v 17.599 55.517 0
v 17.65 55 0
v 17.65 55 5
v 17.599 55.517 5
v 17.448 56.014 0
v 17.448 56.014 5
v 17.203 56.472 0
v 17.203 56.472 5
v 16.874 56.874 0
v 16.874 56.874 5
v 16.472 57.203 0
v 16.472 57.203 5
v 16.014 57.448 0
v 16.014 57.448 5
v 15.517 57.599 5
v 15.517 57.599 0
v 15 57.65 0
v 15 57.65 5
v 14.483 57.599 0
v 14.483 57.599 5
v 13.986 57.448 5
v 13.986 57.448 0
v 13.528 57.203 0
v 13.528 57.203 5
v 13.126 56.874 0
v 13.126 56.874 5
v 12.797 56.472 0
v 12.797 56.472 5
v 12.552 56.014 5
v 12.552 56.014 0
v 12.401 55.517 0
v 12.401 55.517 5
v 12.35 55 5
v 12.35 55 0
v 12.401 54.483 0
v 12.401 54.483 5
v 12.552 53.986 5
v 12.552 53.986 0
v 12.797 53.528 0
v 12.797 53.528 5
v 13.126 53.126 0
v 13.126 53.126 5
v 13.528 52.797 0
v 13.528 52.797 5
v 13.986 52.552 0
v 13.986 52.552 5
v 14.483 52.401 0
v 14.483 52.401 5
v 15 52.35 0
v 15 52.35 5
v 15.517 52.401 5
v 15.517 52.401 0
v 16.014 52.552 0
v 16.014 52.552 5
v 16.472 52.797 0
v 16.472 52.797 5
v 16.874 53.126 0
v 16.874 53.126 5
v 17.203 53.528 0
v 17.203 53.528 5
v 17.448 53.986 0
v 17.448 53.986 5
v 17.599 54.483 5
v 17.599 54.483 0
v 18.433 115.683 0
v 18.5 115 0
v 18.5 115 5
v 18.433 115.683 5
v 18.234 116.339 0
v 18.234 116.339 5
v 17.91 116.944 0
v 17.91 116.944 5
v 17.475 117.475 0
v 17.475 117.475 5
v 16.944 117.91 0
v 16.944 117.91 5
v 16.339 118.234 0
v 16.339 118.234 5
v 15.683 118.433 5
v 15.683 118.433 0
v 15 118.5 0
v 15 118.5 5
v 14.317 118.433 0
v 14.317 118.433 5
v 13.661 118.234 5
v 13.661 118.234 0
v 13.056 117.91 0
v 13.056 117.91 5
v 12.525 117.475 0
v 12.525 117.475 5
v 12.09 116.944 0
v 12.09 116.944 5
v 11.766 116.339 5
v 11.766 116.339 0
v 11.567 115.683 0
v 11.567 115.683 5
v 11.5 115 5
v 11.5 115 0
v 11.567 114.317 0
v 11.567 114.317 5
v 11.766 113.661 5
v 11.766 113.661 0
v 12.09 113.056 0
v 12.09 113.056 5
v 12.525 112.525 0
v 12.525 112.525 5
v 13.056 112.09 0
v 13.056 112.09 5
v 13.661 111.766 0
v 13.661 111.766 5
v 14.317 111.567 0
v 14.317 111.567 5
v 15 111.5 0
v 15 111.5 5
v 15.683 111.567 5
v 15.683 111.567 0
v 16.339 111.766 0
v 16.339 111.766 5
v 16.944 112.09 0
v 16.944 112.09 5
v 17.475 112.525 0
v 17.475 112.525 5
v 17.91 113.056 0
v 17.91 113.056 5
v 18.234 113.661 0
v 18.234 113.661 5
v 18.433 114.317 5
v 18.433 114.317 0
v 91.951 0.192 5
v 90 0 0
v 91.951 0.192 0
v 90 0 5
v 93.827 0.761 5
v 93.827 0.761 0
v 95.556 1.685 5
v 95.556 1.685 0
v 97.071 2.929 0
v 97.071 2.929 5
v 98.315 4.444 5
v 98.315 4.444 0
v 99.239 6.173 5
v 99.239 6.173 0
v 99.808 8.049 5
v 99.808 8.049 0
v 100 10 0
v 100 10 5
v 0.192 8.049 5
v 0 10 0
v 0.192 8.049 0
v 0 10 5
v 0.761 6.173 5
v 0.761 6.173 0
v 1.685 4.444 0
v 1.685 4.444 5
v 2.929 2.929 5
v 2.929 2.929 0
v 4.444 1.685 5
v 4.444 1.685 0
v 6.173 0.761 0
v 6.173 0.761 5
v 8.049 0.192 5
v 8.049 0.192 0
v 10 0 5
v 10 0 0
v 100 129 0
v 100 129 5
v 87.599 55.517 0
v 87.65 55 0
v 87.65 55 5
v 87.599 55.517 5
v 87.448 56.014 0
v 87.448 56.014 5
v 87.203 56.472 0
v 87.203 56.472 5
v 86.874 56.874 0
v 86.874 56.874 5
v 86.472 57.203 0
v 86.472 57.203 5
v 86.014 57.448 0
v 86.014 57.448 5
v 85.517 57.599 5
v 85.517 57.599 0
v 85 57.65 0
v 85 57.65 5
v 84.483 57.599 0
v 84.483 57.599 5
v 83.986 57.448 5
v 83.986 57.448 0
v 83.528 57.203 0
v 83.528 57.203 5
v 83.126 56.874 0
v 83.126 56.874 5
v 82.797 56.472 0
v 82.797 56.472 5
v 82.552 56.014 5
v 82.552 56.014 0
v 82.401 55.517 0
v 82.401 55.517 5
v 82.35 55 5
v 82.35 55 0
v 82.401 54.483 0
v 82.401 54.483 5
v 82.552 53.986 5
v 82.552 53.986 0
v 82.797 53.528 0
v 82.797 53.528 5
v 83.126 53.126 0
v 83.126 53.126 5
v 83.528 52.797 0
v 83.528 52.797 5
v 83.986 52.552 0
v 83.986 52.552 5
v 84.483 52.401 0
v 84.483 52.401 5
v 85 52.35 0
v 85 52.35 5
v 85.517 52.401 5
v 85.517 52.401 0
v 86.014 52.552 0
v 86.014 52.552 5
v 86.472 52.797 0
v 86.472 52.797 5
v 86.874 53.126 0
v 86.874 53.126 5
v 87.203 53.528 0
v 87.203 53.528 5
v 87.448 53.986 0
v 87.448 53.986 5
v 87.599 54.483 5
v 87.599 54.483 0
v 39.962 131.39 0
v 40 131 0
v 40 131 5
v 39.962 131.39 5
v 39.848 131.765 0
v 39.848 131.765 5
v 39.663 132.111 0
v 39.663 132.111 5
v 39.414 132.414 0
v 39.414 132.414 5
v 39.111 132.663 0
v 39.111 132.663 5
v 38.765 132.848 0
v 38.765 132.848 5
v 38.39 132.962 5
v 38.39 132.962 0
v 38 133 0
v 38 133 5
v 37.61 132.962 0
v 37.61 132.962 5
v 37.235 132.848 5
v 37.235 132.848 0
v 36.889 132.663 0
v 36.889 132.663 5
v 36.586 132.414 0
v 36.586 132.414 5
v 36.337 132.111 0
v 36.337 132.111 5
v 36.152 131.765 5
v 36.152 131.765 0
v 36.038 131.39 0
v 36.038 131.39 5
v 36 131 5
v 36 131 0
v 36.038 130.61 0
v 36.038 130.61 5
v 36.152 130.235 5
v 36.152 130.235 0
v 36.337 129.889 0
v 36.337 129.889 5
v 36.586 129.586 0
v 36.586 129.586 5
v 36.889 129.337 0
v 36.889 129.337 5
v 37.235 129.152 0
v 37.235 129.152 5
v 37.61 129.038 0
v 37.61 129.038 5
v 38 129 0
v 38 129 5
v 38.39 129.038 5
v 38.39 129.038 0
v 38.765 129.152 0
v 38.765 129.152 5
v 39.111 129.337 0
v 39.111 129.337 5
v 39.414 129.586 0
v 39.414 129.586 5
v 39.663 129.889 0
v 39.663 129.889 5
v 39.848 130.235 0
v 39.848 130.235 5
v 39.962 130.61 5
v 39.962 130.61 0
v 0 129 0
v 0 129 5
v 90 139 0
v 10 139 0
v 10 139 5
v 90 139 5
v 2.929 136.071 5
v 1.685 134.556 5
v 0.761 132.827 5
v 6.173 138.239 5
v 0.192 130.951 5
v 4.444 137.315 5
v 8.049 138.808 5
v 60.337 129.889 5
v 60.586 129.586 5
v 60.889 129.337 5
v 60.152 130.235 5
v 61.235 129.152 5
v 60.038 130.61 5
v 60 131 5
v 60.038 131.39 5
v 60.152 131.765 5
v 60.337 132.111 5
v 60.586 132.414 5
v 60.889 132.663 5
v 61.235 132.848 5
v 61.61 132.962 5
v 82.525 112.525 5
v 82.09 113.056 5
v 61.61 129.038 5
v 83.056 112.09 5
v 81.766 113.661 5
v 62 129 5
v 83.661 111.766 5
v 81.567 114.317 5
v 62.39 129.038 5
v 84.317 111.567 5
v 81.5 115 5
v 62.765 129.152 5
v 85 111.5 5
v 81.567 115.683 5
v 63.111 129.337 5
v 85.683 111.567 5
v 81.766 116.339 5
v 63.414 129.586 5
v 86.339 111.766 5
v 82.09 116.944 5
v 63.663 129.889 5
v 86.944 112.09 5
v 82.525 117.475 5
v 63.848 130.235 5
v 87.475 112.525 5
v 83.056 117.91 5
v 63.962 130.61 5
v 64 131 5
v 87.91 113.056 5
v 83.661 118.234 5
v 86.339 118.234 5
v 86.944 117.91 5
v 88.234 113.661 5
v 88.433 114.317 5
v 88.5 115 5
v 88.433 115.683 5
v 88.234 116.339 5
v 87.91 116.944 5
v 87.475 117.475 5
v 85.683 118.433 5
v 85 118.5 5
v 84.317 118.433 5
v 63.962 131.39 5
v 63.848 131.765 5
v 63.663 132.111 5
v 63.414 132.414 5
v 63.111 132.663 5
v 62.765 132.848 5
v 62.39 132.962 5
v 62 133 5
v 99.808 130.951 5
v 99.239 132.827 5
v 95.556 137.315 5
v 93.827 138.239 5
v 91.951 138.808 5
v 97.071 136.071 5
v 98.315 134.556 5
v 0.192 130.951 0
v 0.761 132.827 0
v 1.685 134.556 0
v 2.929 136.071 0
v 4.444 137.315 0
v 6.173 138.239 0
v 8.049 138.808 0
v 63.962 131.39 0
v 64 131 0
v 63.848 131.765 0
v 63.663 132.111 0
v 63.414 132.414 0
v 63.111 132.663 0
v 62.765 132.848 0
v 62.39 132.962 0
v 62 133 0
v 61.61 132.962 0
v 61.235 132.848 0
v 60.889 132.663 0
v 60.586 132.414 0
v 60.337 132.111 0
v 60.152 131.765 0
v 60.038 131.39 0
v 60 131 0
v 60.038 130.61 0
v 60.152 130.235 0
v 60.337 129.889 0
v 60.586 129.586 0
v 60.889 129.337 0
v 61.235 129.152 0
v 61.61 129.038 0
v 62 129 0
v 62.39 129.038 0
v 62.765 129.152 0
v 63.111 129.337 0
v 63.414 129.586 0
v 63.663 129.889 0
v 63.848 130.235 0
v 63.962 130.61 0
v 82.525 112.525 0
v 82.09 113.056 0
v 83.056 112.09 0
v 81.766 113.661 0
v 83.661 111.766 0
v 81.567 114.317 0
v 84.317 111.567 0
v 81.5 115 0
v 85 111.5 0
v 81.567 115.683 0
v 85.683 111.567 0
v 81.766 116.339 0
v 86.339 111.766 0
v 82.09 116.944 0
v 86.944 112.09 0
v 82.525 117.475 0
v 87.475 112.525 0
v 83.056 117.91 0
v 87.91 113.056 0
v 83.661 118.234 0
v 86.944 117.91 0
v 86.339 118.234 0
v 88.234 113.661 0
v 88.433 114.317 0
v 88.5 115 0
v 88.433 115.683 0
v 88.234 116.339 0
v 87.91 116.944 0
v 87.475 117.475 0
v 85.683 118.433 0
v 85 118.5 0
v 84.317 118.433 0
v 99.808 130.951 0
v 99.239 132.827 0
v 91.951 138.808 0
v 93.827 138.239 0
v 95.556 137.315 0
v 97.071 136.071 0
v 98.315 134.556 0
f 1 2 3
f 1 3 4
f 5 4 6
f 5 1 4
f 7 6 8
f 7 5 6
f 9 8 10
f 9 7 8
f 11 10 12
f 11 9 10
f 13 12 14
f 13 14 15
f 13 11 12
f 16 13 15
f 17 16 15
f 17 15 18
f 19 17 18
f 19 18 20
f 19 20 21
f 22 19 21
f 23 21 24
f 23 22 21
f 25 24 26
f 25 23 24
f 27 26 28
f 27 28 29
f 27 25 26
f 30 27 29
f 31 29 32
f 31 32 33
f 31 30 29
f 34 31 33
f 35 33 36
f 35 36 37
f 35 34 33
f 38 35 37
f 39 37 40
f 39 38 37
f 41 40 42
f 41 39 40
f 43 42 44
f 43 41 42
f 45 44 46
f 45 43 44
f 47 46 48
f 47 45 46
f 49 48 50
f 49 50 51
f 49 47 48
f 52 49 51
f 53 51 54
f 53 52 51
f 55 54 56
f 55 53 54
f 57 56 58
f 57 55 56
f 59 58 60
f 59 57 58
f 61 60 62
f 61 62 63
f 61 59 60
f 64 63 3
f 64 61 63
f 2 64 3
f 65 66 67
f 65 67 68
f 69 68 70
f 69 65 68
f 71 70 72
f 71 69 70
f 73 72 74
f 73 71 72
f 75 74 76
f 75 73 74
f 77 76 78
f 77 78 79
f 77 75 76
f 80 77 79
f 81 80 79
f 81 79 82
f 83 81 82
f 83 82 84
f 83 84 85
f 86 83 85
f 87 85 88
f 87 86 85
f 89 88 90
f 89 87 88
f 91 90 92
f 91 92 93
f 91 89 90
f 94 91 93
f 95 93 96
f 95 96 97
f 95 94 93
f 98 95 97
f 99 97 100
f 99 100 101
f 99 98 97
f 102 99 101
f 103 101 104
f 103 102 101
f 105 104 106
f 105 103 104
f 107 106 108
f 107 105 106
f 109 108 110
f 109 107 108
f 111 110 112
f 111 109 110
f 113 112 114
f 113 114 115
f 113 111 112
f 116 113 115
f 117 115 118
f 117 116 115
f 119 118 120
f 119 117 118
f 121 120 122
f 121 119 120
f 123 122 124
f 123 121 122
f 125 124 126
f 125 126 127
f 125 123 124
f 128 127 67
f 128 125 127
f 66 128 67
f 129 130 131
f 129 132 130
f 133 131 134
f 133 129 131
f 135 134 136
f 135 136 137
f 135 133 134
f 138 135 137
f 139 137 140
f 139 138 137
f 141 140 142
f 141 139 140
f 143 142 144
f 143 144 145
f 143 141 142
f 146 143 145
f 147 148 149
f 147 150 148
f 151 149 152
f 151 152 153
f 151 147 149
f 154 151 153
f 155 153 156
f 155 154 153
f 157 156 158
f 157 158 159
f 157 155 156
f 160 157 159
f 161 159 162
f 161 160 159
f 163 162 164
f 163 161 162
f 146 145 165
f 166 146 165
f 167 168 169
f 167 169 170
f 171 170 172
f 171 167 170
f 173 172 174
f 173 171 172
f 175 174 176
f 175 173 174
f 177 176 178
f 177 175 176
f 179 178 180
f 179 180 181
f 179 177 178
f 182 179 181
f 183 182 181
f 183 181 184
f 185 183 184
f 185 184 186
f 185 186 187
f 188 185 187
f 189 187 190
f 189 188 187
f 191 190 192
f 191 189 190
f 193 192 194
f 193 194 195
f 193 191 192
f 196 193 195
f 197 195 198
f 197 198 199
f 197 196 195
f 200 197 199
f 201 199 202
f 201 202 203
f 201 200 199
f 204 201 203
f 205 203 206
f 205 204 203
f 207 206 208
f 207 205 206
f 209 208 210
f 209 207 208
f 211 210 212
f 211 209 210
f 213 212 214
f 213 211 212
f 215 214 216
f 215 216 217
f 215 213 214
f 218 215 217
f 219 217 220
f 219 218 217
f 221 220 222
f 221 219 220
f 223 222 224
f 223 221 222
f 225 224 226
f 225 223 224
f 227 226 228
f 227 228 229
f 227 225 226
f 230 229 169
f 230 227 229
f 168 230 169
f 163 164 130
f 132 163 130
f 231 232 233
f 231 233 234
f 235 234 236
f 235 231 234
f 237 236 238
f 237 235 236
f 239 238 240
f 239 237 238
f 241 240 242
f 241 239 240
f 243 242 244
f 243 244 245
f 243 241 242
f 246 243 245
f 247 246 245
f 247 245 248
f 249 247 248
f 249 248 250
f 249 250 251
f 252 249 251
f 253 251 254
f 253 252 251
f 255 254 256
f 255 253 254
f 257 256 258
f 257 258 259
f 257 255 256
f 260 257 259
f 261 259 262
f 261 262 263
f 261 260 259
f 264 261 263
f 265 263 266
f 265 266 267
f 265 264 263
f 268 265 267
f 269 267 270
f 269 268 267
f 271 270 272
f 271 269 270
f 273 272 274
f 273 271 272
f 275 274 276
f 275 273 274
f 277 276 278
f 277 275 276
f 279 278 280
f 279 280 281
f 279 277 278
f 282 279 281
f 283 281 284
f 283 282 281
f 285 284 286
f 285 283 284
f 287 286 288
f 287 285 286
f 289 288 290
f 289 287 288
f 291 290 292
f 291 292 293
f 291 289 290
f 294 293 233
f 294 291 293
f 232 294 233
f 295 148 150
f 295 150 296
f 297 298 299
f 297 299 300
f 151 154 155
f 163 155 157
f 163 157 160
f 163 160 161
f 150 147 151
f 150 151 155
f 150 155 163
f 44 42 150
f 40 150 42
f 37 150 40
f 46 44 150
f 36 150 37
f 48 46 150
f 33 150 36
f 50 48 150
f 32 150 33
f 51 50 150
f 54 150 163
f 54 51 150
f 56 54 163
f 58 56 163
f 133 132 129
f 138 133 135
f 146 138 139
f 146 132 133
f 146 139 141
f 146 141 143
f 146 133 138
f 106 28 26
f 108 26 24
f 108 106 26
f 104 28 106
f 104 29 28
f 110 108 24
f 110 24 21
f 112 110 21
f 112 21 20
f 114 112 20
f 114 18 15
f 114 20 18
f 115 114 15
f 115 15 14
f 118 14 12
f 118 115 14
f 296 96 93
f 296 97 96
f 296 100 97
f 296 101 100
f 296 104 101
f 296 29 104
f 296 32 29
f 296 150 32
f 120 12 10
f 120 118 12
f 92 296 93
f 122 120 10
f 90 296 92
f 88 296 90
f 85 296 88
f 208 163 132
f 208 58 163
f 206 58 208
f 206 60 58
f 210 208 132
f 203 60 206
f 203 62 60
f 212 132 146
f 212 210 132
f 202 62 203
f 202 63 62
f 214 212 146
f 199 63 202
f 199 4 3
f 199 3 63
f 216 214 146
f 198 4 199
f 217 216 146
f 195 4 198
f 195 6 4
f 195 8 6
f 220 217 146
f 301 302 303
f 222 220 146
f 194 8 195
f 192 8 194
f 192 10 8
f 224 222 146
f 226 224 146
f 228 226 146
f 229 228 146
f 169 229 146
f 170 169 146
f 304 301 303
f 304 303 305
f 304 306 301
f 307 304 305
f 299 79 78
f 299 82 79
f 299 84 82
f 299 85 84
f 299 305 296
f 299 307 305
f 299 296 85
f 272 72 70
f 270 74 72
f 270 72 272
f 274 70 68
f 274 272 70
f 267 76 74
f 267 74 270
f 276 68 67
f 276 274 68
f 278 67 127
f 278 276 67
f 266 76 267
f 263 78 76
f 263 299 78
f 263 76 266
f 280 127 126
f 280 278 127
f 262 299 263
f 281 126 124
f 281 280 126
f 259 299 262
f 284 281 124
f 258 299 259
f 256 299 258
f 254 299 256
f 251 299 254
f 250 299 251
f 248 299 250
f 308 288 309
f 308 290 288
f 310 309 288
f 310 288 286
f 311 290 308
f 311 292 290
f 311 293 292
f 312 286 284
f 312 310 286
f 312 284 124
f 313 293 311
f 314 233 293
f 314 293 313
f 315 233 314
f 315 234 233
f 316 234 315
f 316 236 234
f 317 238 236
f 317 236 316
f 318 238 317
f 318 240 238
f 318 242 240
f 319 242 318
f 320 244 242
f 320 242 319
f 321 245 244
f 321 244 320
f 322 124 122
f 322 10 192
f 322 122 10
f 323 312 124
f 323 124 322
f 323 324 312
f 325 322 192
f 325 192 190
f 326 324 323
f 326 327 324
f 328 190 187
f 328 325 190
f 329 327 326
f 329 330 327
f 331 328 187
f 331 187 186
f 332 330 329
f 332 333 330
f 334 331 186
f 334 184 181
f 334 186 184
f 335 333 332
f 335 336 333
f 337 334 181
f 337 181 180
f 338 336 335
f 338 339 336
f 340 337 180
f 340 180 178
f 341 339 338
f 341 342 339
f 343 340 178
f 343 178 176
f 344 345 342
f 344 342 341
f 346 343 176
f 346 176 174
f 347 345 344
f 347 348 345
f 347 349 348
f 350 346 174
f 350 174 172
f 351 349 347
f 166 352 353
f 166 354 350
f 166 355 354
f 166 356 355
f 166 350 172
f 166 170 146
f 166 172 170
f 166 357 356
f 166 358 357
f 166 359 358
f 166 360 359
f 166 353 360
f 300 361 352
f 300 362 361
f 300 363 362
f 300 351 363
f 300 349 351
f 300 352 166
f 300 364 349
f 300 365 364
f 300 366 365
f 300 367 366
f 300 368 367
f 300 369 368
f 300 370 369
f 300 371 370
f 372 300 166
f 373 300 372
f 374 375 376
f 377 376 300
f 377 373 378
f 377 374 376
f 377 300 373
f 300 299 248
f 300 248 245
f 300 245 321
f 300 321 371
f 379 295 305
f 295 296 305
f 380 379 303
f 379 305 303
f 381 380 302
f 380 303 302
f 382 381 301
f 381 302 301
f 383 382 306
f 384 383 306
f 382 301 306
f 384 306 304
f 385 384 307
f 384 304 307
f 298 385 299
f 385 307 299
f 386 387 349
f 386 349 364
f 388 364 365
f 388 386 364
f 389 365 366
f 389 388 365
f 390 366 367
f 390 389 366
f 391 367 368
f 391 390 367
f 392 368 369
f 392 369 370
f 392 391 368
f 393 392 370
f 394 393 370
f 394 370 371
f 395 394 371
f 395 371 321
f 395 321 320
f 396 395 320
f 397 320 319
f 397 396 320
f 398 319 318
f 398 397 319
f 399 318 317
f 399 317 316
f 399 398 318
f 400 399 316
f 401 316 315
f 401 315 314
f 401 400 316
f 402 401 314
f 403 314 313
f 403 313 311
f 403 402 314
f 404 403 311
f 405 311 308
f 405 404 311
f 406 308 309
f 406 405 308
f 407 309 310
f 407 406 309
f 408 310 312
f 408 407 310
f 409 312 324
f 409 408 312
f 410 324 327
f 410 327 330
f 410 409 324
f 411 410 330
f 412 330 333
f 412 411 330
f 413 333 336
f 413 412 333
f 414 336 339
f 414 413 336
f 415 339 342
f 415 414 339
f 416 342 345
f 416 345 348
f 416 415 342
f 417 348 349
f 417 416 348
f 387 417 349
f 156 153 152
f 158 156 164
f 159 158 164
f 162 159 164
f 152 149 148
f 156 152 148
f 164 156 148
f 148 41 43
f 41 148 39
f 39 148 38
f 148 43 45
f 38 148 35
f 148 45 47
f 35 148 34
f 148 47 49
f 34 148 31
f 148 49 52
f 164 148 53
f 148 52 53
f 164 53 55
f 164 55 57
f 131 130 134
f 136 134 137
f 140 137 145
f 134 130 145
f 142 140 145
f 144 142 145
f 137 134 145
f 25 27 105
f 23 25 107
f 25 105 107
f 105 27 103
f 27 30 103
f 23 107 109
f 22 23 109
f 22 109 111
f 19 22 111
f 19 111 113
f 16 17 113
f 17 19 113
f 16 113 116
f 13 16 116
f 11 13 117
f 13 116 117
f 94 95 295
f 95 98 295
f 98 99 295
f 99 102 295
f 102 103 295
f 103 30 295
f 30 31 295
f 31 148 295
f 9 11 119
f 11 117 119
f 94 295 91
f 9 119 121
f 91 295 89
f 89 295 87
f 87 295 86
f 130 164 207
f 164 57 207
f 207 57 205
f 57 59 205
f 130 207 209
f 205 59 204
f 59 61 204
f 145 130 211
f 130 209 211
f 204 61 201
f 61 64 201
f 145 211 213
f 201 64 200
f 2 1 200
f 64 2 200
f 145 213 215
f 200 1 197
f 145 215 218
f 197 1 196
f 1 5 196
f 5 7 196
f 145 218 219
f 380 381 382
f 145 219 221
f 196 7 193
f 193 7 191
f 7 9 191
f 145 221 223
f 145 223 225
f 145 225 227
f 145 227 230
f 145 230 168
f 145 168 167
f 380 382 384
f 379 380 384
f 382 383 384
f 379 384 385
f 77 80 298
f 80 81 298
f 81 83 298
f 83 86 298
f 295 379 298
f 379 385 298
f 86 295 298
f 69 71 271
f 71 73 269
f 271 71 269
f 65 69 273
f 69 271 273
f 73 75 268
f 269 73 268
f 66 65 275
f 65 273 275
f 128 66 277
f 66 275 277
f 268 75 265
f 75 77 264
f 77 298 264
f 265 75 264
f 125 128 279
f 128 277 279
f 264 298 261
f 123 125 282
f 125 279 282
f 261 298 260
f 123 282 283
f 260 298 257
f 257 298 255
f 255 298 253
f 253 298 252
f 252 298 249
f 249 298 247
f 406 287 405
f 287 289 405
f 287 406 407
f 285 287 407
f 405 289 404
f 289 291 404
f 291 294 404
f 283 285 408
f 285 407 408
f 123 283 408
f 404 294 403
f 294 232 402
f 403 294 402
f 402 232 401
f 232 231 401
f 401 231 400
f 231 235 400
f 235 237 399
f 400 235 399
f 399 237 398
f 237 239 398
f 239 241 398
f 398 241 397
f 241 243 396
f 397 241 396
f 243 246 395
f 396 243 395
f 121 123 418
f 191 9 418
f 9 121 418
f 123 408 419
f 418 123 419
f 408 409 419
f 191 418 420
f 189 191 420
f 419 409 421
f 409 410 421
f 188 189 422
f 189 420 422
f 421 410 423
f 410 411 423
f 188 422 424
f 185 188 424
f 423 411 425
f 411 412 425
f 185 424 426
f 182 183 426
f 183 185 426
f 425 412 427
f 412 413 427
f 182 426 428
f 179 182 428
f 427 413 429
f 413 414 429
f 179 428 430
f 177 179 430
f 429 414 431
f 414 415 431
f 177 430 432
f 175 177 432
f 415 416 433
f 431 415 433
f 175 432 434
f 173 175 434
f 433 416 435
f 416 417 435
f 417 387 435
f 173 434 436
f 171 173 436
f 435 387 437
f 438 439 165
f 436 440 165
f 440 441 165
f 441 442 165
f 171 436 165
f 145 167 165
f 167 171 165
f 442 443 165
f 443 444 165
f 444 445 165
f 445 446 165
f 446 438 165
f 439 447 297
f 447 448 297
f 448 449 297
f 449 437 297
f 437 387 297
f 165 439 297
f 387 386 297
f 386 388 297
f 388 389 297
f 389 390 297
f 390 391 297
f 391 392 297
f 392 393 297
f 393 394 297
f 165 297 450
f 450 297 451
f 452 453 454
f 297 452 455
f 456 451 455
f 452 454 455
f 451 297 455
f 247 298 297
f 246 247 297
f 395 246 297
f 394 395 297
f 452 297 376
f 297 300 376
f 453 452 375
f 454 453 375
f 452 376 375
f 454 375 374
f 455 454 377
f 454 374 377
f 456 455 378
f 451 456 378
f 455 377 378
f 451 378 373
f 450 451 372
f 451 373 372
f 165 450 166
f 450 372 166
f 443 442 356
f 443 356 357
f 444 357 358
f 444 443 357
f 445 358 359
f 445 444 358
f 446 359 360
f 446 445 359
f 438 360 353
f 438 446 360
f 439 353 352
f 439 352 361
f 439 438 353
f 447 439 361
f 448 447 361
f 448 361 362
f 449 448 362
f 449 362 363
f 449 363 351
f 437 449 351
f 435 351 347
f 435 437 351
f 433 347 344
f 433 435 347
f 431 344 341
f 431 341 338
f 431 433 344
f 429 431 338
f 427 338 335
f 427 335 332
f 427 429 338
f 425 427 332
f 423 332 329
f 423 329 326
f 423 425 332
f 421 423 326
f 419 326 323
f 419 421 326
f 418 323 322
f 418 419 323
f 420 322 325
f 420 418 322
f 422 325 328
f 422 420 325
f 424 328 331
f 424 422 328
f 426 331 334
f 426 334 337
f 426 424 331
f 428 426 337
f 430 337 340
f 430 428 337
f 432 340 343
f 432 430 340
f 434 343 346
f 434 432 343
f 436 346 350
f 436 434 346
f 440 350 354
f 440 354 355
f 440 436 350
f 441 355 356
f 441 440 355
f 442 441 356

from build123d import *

# Parameters (mm, degrees)
CROQUIS1_W              = 100
CROQUIS1_H              = 139
CROQUIS1_R              = 2.65
CROQUIS1_R_2            = 3.5
CROQUIS1_R_3            = 2
SALIENTE_EXTRUIR1_DEPTH = 5
REDONDEO3_R             = 10


with BuildPart() as part:
    # Croquis1 → Saliente-Extruir1 (new body)
    with BuildSketch(Plane.XY):
        with Locations((50, 69.5)):
            Rectangle(CROQUIS1_W, CROQUIS1_H)
        with Locations((15, 55)):
            Circle(CROQUIS1_R, mode=Mode.SUBTRACT)
        with Locations((85, 55)):
            Circle(CROQUIS1_R, mode=Mode.SUBTRACT)
        with Locations((15, 115)):
            Circle(CROQUIS1_R_2, mode=Mode.SUBTRACT)
        with Locations((38, 131)):
            Circle(CROQUIS1_R_3, mode=Mode.SUBTRACT)
        with Locations((62, 131)):
            Circle(CROQUIS1_R_3, mode=Mode.SUBTRACT)
        with Locations((85, 115)):
            Circle(CROQUIS1_R_2, mode=Mode.SUBTRACT)
    extrude(amount=SALIENTE_EXTRUIR1_DEPTH)

    # Redondeo3
    redondeo3_edges = [part.edges().sort_by_distance(p)[0] for p in [
        (0, 0, 2.5),
        (100, 0, 2.5),
        (100, 139, 2.5),
        (0, 139, 2.5),
    ]]
    fillet(redondeo3_edges, radius=REDONDEO3_R)


solid = part.part
